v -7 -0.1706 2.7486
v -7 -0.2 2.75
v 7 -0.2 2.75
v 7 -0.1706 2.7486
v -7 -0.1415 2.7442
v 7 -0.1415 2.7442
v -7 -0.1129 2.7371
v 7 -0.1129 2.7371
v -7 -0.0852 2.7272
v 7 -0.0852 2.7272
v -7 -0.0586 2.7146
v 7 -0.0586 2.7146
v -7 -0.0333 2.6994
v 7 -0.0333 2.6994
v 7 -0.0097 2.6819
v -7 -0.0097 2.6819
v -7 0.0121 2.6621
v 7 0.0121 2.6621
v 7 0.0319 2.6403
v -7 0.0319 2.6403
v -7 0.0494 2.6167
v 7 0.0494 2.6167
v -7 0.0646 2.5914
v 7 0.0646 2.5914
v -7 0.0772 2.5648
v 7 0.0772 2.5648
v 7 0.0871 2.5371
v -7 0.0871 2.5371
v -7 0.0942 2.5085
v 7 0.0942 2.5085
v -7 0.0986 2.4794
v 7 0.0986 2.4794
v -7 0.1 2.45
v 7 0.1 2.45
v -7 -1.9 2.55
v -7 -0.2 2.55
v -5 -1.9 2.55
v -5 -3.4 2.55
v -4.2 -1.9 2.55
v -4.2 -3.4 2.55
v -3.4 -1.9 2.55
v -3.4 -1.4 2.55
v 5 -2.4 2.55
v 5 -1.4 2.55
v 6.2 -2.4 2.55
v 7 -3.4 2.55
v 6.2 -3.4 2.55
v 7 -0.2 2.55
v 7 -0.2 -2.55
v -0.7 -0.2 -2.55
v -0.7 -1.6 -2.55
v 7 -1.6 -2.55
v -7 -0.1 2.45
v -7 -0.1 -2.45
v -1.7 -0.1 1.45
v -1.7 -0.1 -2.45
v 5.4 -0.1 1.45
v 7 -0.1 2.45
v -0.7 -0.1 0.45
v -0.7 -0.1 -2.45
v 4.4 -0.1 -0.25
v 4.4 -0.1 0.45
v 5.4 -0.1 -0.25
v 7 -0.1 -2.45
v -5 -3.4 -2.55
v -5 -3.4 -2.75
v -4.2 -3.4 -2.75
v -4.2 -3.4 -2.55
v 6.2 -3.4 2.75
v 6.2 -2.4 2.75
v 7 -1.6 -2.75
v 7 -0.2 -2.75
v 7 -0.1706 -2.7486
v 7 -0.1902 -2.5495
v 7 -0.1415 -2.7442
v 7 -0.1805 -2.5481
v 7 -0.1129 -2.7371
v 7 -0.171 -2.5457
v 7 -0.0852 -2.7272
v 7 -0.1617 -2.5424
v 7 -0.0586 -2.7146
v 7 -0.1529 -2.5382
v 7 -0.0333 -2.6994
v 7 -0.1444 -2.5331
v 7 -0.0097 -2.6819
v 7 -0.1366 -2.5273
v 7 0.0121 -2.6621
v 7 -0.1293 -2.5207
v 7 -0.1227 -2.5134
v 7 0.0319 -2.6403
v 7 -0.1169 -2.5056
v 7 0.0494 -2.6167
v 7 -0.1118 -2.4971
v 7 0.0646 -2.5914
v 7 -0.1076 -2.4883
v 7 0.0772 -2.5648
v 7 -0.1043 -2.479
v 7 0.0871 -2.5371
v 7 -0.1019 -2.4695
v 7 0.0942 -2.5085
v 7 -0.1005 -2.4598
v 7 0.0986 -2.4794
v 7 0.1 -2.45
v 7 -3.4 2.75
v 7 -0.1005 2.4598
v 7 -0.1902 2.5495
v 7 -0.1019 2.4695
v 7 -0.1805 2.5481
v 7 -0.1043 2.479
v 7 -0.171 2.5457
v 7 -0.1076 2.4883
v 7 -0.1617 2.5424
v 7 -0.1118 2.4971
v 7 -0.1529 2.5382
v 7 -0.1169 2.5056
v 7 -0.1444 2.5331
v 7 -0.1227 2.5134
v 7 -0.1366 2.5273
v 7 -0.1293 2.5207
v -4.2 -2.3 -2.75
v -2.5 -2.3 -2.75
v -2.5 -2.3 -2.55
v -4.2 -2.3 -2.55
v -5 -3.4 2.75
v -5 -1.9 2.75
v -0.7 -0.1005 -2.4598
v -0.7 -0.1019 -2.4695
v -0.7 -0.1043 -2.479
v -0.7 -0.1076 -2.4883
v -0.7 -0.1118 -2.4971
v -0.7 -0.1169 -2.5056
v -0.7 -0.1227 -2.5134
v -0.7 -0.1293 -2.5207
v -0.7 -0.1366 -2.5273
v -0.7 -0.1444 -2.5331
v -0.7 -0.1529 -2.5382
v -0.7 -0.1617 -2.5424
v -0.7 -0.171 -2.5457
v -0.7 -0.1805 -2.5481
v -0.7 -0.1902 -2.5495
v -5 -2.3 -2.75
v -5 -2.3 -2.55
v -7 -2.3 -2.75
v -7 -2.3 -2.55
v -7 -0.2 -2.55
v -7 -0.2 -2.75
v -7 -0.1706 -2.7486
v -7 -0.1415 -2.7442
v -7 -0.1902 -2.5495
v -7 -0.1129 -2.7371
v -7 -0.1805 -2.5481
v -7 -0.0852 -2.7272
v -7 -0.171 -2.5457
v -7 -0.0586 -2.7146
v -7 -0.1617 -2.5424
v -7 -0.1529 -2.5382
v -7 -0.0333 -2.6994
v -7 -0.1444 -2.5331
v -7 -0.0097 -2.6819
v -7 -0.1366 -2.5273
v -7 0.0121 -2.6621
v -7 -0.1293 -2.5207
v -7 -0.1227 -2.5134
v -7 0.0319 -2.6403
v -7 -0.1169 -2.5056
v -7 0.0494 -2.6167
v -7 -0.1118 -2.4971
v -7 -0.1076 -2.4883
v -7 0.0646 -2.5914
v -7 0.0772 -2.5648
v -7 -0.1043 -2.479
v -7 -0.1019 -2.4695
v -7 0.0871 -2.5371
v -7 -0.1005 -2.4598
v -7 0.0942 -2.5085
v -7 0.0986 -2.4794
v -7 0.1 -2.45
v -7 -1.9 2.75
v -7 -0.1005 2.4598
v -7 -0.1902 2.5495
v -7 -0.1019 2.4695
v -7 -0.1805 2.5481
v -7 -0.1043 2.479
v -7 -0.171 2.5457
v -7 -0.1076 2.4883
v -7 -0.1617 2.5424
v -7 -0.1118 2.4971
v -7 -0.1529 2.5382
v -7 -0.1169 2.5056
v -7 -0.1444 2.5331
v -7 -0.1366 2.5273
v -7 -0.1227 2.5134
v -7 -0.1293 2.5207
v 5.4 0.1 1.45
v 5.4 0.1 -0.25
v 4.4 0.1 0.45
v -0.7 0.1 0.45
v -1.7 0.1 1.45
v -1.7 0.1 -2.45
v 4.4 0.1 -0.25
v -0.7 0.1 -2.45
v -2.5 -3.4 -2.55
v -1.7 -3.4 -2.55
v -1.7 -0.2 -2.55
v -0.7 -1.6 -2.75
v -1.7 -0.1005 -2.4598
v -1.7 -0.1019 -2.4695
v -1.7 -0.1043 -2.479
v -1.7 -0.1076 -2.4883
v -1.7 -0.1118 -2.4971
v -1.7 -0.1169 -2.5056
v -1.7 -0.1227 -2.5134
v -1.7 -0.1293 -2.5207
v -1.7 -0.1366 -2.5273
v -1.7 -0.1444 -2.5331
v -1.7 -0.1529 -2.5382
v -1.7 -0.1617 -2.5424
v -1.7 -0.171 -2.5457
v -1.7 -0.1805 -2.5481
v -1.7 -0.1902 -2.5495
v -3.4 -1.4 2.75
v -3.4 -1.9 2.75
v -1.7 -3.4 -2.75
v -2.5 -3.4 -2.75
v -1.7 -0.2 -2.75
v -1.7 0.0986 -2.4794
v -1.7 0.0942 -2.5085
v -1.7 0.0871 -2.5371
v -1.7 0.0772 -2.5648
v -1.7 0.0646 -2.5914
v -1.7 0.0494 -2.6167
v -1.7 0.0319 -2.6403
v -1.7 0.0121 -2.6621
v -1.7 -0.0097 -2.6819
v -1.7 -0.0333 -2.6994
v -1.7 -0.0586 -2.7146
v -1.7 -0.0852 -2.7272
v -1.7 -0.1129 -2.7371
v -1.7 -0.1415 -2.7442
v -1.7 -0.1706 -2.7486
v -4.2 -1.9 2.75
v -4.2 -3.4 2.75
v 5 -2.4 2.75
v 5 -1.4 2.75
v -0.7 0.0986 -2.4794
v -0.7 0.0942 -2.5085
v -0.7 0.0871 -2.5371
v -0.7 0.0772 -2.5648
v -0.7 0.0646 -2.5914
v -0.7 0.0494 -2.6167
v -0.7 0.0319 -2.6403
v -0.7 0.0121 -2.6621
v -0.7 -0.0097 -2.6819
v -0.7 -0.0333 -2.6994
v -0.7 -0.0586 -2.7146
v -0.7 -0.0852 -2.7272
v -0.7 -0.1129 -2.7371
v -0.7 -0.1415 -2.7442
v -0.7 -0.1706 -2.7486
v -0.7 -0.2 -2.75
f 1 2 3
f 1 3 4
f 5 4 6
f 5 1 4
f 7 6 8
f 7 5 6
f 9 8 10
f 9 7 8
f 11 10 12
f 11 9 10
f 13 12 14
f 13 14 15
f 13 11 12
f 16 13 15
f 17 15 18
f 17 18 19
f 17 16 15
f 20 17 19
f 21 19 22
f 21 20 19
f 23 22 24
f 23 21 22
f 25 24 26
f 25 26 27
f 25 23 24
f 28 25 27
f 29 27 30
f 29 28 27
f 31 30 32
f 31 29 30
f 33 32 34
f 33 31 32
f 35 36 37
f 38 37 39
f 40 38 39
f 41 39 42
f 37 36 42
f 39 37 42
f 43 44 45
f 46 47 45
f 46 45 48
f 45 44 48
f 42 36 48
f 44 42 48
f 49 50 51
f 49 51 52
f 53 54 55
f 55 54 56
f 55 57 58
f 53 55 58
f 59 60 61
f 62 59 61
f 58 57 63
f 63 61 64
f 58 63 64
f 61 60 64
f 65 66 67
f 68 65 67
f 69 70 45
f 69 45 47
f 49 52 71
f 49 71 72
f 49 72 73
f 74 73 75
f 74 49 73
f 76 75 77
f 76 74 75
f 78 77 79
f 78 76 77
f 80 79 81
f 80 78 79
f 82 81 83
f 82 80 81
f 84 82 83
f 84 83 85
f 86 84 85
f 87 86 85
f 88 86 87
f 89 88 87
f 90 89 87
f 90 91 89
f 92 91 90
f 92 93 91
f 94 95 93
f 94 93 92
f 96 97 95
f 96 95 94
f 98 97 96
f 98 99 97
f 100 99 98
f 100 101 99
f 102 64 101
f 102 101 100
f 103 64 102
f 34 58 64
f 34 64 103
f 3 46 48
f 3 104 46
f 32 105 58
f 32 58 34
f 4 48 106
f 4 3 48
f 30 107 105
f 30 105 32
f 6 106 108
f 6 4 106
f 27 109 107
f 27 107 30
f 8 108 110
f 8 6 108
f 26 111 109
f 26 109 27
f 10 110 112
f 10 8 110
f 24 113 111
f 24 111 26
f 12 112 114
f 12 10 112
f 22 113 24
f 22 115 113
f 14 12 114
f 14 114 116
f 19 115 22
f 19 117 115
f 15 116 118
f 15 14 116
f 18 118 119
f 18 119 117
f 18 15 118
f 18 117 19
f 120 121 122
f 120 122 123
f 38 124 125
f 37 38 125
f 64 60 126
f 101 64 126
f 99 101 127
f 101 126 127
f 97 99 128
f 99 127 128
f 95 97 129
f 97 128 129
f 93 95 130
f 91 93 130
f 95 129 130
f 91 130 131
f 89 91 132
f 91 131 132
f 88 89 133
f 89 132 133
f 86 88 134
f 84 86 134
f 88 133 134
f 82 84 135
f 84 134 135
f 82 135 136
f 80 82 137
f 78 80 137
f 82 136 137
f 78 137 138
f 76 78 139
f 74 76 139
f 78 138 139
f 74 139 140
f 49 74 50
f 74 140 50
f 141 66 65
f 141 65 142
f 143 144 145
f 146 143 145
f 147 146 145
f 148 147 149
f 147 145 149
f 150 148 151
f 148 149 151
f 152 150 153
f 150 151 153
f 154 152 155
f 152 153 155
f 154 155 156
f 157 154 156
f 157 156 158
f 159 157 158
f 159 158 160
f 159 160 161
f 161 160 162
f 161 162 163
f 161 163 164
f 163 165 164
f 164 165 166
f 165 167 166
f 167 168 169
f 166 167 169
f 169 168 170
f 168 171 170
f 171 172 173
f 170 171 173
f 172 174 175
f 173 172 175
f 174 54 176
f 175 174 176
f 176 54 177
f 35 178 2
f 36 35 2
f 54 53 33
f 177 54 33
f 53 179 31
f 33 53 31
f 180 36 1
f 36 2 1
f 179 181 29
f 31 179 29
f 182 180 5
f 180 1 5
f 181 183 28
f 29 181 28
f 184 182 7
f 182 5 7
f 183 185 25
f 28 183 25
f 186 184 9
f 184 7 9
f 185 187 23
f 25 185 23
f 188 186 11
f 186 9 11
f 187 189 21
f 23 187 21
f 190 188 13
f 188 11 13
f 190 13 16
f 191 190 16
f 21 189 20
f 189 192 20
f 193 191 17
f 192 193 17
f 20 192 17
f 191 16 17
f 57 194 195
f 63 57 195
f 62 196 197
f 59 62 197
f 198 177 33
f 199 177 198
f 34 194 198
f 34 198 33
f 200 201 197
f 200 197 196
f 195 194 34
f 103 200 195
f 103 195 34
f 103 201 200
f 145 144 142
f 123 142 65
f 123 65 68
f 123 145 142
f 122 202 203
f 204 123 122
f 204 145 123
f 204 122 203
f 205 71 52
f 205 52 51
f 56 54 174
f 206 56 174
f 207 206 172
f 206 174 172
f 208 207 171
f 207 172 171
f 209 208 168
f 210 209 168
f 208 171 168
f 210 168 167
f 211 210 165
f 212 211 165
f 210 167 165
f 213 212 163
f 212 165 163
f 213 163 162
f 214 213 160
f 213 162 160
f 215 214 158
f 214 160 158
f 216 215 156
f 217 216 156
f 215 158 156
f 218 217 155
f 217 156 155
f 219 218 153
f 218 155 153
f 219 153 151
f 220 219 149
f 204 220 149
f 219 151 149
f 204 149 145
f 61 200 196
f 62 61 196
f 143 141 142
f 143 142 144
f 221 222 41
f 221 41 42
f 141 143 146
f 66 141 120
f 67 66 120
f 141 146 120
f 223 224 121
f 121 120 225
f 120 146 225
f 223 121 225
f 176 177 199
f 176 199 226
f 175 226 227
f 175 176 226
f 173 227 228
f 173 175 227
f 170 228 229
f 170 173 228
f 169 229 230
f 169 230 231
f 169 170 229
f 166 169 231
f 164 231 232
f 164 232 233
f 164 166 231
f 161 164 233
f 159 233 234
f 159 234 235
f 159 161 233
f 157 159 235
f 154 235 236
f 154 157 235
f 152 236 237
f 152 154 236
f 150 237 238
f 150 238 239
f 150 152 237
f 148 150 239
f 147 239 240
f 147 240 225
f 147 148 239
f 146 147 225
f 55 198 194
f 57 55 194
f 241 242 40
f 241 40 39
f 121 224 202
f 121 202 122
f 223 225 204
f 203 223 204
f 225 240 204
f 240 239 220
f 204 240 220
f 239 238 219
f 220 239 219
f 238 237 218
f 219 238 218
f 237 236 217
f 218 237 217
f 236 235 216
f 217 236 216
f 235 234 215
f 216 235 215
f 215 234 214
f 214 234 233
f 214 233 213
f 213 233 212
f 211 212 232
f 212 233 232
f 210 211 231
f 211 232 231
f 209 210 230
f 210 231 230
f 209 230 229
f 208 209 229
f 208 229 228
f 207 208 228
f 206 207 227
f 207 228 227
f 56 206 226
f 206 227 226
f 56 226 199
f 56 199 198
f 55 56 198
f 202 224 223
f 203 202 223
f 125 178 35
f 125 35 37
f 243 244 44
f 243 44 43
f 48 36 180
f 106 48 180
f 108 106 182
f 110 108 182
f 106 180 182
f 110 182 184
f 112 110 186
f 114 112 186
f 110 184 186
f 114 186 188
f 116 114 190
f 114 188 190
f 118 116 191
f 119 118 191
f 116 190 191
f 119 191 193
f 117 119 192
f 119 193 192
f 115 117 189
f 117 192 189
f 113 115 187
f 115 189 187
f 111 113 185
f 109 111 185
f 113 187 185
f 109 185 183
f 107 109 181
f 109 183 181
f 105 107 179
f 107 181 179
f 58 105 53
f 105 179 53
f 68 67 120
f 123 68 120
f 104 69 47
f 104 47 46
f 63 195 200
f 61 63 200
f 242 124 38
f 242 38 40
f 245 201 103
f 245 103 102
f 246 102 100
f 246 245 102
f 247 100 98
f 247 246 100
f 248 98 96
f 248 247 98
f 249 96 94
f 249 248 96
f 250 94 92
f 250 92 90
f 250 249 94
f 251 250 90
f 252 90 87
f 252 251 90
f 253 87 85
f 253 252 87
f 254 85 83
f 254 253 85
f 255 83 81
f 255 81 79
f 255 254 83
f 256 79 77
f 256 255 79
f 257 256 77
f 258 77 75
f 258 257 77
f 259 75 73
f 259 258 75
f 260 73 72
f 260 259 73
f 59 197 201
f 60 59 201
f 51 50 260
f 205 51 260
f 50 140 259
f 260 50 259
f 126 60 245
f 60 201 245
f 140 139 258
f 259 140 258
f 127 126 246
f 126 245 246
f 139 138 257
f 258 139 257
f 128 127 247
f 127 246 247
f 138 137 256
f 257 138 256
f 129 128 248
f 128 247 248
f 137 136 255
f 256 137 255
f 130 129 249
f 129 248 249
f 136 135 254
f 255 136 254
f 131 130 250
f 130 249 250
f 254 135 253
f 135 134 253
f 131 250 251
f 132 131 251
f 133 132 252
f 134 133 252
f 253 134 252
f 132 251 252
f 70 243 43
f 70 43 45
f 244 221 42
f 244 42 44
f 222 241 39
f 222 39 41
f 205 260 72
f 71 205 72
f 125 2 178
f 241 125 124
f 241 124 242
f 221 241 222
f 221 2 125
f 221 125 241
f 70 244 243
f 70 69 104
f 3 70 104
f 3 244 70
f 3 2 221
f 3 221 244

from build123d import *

# Parameters (mm, degrees)
SKETCH2_W              = 14
SKETCH2_H              = 5.5
BOSS_EXTRUDE1_DEPTH    = 0.1
SKETCH3_W              = 14
SKETCH3_H              = 3.5
BOSS_EXTRUDE2_DEPTH    = 0.2
CONVERT_SOLID1_START   = -7
CONVERT_SOLID1_DEPTH   = 14
CONVERT_SOLID1_2_DEPTH = 14
CUT_EXTRUDE1_REACH     = 11.529
SKETCH8_W              = 2
SKETCH8_H              = 1.5
CUT_EXTRUDE2_REACH     = 11.529
SKETCH9_W              = 8.7
SKETCH9_H              = 1.8
SKETCH9_W_2            = 1.7
SKETCH9_H_2            = 1.1
SKETCH9_W_3            = 2
CUT_EXTRUDE3_REACH     = 10.295


# Read off the part's stored shape, not the designer's step: Convert-Solid1
with BuildPart() as part:
    # Sketch2 → Boss-Extrude1 (new, symmetric)
    with BuildSketch(Plane(origin=(0, 0, 0), x_dir=(1, 0, 0), z_dir=(0, 1, 0))):
        Rectangle(SKETCH2_W, SKETCH2_H)
    extrude(amount=BOSS_EXTRUDE1_DEPTH, both=True)

    # Sketch3 → Boss-Extrude2 (add)
    with BuildSketch(Plane.XY.offset(2.75)):
        with Locations((0, -1.65)):
            Rectangle(SKETCH3_W, SKETCH3_H)
    boss_extrude2 = extrude(amount=-BOSS_EXTRUDE2_DEPTH)

    # Mirror1: Boss-Extrude2 across plane
    add(boss_extrude2.mirror(Plane.XY))

    # Convert-Solid1 outline → Convert-Solid1 (cut)
    with BuildSketch(Plane.YZ.offset(CONVERT_SOLID1_START)):
        with BuildLine():
            Line((0.1, 2.75), (-0.2, 2.75))
            ThreePointArc((-0.2, 2.75), (0.012132034, 2.662132034), (0.1, 2.45))
            Line((0.1, 2.45), (0.1, 2.75))
        make_face()
        with BuildLine():
            Line((0.1, -2.75), (0.1, -2.45))
            ThreePointArc((0.1, -2.45), (0.012132034, -2.662132034), (-0.2, -2.75))
            Line((-0.2, -2.75), (0.1, -2.75))
        make_face()
    extrude(amount=CONVERT_SOLID1_DEPTH, mode=Mode.SUBTRACT)

    # Convert-Solid1 2 outline → Convert-Solid1 2 (add)
    with BuildSketch(Plane.YZ.offset(CONVERT_SOLID1_START)):
        with BuildLine():
            Line((-0.1, 2.55), (-0.2, 2.55))
            ThreePointArc((-0.2, 2.55), (-0.129289322, 2.520710678), (-0.1, 2.45))
            Line((-0.1, 2.45), (-0.1, 2.55))
        make_face()
        with BuildLine():
            Line((-0.1, -2.55), (-0.1, -2.45))
            ThreePointArc((-0.1, -2.45), (-0.129289322, -2.520710678), (-0.2, -2.55))
            Line((-0.2, -2.55), (-0.1, -2.55))
        make_face()
    extrude(amount=CONVERT_SOLID1_2_DEPTH)

    # Sketch8 → Cut-Extrude1 (cut, up to next)
    with BuildSketch(Plane.XY.offset(2.75), mode=Mode.PRIVATE) as cut_extrude1_sk1:
        Polygon((-4.2, -3.4), (-4.2, -1.9), (-3.4, -1.9), (-3.4, -1.4), (5, -1.4), (5, -2.4), (6.2, -2.4), (6.2, -3.4), align=None)
    cut_extrude1_tool1 = extrude(cut_extrude1_sk1.sketch, amount=-CUT_EXTRUDE1_REACH, mode=Mode.PRIVATE) & part.part
    # Sketch8 → Cut-Extrude1 (cut, up to next)
    with BuildSketch(Plane.XY.offset(2.75), mode=Mode.PRIVATE) as cut_extrude1_sk2:
        with Locations((-6, -2.65)):
            Rectangle(SKETCH8_W, SKETCH8_H)
    cut_extrude1_tool2 = extrude(cut_extrude1_sk2.sketch, amount=-CUT_EXTRUDE1_REACH, mode=Mode.PRIVATE) & part.part
    add(cut_extrude1_tool1.solids().sort_by_distance((0.8125, -2.446875, 2.75))[0], mode=Mode.SUBTRACT)
    add(cut_extrude1_tool2.solids().sort_by_distance((-6, -2.65, 2.75))[0], mode=Mode.SUBTRACT)

    # Sketch9 → Cut-Extrude2 (cut, up to next)
    with BuildSketch(Plane(origin=(0, 0, -2.75), x_dir=(-1, 0, 0), z_dir=(0, 0, -1)), mode=Mode.PRIVATE) as cut_extrude2_sk1:
        with Locations((-2.65, -2.5)):
            Rectangle(SKETCH9_W, SKETCH9_H)
    cut_extrude2_tool1 = extrude(cut_extrude2_sk1.sketch, amount=-CUT_EXTRUDE2_REACH, mode=Mode.PRIVATE) & part.part
    # Sketch9 → Cut-Extrude2 (cut, up to next)
    with BuildSketch(Plane(origin=(0, 0, -2.75), x_dir=(-1, 0, 0), z_dir=(0, 0, -1)), mode=Mode.PRIVATE) as cut_extrude2_sk2:
        with Locations((3.35, -2.85)):
            Rectangle(SKETCH9_W_2, SKETCH9_H_2)
    cut_extrude2_tool2 = extrude(cut_extrude2_sk2.sketch, amount=-CUT_EXTRUDE2_REACH, mode=Mode.PRIVATE) & part.part
    # Sketch9 → Cut-Extrude2 (cut, up to next)
    with BuildSketch(Plane(origin=(0, 0, -2.75), x_dir=(-1, 0, 0), z_dir=(0, 0, -1)), mode=Mode.PRIVATE) as cut_extrude2_sk3:
        with Locations((6, -2.85)):
            Rectangle(SKETCH9_W_3, SKETCH9_H_2)
    cut_extrude2_tool3 = extrude(cut_extrude2_sk3.sketch, amount=-CUT_EXTRUDE2_REACH, mode=Mode.PRIVATE) & part.part
    add(cut_extrude2_tool1.solids().sort_by_distance((2.65, -2.5, -2.75))[0], mode=Mode.SUBTRACT)
    add(cut_extrude2_tool2.solids().sort_by_distance((-3.35, -2.85, -2.75))[0], mode=Mode.SUBTRACT)
    add(cut_extrude2_tool3.solids().sort_by_distance((-6, -2.85, -2.75))[0], mode=Mode.SUBTRACT)

    # Sketch10 → Cut-Extrude3 (cut, up to next)
    with BuildSketch(Plane(origin=(0, 0.1, 0), x_dir=(1, 0, 0), z_dir=(0, 1, 0)), mode=Mode.PRIVATE) as cut_extrude3_sk1:
        Polygon((-1.7, -1.45), (5.4, -1.45), (5.4, 0.25), (4.4, 0.25), (4.4, -0.45), (-0.7, -0.45), (-0.7, 2.75), (-1.7, 2.75), align=None)
    cut_extrude3_tool1 = extrude(cut_extrude3_sk1.sketch, amount=-CUT_EXTRUDE3_REACH, mode=Mode.PRIVATE) & part.part
    add(cut_extrude3_tool1.solids().sort_by_distance((1.85, 0.1, 1.367508))[0], mode=Mode.SUBTRACT)


solid = part.part
